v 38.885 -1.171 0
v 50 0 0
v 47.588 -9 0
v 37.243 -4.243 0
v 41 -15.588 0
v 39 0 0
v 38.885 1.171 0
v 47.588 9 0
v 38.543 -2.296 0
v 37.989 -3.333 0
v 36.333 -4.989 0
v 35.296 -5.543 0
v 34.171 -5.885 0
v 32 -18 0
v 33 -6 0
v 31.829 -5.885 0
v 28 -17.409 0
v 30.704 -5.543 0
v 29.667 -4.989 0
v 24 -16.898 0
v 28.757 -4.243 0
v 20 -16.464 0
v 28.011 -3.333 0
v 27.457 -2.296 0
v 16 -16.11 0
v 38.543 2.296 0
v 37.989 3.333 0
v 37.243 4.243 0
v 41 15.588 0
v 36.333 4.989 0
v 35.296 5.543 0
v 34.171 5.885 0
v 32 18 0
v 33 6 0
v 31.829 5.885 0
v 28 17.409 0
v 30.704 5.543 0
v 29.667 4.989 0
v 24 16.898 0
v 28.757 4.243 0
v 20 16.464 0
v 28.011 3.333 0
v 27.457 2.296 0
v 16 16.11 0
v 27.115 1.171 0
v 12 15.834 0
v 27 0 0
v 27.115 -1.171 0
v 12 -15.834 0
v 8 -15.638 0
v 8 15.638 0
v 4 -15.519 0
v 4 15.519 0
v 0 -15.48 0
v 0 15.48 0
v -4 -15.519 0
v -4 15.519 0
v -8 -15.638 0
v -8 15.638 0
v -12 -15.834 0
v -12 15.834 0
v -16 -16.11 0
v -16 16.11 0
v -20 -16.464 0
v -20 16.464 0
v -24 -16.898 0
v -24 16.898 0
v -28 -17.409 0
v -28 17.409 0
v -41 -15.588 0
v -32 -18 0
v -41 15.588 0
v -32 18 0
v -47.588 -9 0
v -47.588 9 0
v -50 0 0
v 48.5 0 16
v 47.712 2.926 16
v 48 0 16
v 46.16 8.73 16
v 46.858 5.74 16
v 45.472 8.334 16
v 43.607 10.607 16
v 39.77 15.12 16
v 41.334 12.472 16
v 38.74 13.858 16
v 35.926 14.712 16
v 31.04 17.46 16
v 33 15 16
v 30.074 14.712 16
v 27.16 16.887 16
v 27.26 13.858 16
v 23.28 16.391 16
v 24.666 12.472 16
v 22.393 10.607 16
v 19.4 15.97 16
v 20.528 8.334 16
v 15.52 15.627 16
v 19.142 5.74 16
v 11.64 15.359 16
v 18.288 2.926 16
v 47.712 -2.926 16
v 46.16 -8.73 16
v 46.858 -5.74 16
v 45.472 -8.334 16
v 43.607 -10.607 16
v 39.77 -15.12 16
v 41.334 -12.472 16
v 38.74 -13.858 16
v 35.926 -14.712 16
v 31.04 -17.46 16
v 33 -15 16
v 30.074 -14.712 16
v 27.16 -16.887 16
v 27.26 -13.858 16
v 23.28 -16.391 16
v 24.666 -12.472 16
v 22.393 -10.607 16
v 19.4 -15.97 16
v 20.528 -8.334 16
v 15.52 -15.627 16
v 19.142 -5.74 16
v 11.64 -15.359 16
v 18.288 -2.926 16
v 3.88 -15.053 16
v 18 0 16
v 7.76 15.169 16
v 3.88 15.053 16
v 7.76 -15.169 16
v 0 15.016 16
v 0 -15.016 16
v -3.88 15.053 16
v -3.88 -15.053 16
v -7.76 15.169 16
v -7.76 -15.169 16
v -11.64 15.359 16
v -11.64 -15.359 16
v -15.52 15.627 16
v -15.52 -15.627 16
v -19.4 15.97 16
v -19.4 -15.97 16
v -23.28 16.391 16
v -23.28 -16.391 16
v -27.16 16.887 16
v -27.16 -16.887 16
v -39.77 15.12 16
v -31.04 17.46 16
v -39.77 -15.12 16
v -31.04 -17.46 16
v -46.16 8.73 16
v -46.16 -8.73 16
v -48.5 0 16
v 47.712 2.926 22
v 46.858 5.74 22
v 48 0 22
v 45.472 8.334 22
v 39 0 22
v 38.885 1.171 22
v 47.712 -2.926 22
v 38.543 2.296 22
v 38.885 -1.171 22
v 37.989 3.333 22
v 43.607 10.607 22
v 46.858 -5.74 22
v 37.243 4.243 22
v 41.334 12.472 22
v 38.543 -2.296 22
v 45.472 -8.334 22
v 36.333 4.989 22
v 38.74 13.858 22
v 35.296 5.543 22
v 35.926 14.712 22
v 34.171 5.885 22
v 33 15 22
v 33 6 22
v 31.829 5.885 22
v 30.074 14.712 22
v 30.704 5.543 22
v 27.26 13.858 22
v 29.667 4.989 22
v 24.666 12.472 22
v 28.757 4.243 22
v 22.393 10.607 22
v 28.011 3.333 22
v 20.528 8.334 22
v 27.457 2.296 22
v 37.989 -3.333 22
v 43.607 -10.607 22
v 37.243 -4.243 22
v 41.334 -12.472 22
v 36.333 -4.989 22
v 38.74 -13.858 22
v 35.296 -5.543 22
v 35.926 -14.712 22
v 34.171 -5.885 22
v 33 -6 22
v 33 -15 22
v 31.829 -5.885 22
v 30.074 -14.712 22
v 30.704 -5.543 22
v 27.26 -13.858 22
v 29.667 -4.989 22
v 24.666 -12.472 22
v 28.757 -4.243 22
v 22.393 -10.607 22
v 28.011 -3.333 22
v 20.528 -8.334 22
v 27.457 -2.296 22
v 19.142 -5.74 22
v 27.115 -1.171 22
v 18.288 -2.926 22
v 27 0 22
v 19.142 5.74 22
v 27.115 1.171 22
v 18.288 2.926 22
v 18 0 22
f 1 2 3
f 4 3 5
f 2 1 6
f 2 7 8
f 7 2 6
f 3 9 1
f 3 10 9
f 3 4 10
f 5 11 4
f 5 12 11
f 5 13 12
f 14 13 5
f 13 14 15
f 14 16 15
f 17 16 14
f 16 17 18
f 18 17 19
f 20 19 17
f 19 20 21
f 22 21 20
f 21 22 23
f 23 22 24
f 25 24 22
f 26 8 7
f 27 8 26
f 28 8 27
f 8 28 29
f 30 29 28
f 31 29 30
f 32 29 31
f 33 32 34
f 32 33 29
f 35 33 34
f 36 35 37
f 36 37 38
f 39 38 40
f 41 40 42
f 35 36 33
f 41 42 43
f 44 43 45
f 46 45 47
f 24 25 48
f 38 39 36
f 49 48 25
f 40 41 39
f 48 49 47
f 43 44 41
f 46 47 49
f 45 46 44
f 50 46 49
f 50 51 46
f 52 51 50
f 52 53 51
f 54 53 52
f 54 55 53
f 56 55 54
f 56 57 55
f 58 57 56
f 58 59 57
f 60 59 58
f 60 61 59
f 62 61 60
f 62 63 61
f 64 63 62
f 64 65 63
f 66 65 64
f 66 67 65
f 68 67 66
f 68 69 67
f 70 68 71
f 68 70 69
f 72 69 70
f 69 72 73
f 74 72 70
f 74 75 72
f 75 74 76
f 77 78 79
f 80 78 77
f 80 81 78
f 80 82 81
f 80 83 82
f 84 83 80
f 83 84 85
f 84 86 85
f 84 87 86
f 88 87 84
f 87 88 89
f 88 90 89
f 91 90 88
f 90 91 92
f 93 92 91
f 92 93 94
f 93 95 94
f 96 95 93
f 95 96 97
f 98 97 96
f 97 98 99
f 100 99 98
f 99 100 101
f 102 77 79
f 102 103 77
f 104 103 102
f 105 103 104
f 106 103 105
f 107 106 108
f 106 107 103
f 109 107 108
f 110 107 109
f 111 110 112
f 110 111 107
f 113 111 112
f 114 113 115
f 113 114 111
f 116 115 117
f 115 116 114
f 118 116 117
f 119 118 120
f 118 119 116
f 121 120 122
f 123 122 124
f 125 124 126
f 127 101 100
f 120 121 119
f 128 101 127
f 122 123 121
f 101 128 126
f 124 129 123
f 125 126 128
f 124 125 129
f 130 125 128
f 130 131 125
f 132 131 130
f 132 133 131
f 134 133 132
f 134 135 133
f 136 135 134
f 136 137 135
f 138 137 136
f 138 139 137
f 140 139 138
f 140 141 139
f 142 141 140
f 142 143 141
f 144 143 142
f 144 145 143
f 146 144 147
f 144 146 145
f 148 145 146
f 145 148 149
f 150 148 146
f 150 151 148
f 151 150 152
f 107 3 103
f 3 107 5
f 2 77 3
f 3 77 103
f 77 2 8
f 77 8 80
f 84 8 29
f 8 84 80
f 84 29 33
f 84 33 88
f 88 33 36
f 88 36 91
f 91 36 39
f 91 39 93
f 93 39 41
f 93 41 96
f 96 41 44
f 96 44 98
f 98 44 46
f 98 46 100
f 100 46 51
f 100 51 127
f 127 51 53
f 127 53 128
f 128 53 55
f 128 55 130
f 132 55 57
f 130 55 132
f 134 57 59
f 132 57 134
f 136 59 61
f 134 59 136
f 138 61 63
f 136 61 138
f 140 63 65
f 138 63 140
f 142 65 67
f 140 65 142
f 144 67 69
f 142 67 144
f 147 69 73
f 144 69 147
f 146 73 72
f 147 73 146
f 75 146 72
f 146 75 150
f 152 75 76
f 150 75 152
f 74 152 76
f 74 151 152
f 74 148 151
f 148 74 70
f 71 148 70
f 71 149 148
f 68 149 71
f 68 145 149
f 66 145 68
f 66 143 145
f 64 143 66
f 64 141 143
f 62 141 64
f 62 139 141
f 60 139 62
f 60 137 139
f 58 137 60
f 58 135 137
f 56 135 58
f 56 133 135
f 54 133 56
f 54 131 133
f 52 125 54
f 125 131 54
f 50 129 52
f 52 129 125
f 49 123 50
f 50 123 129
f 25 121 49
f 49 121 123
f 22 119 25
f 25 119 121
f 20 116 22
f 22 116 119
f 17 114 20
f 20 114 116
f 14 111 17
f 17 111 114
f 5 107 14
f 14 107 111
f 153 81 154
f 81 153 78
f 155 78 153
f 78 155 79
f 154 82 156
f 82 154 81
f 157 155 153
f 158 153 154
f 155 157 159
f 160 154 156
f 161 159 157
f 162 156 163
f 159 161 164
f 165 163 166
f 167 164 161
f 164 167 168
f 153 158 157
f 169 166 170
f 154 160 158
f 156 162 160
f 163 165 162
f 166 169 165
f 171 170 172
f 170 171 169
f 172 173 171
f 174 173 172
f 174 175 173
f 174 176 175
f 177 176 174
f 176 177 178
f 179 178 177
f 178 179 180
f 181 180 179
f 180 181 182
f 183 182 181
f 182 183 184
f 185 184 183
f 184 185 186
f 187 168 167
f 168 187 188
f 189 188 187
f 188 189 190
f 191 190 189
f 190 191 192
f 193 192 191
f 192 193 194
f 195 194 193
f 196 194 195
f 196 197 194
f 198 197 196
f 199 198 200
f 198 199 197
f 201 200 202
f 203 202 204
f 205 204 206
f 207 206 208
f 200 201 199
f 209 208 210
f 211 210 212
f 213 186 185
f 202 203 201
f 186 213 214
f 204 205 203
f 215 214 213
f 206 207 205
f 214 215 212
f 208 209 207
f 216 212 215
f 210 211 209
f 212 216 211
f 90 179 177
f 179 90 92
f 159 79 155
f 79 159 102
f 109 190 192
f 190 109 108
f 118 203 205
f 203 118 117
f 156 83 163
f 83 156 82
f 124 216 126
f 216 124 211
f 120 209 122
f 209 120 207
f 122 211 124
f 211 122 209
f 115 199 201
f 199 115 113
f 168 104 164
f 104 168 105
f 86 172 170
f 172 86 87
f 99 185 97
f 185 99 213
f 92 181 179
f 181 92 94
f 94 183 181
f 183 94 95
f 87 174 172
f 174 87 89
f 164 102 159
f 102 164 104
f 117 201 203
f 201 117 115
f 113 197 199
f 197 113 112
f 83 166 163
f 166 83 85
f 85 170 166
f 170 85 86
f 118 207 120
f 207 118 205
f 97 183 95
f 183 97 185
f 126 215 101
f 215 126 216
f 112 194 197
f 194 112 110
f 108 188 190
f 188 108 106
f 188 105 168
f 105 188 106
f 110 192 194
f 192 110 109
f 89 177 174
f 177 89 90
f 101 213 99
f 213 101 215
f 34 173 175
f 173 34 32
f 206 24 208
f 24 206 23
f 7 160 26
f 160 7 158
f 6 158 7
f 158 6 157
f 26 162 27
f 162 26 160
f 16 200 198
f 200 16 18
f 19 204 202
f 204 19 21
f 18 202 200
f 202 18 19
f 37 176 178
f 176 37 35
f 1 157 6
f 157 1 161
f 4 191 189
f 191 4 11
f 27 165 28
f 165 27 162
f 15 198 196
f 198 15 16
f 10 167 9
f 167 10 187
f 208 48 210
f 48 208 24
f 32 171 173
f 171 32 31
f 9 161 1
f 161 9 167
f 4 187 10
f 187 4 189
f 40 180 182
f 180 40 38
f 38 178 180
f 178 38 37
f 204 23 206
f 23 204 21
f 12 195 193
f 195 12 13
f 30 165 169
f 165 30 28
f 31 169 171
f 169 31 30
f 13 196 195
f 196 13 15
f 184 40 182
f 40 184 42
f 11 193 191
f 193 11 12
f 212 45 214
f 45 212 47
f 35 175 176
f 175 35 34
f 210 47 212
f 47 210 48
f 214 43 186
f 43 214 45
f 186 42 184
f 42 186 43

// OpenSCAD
$fn = 32;

// ----------------------------------------------------------------------
// Handle: 100 x 36 mm grip, 16 mm thick
// ----------------------------------------------------------------------

// --- parameters (mm) ---
length = 100;             // grip length
width = 36;               // grip width
thickness = 16;           // grip thickness
waist = 0.86;             // width factor at the middle
draft = 0.97;             // top face scale of the extrusion
boss_d = 30;              // mounting boss diameter
boss_h = 6;               // mounting boss height
boss_hole_d = 12;         // screw clearance through the boss
boss_r = 33;              // boss centre from the grip centre

/* ergonomic grip outline, closed spline-like polygon in the XY plane */
grip = [[-32, 18], [-28, 17.409], [-24, 16.898], [-20, 16.464], [-16, 16.11], [-12, 15.834], [-8, 15.638], [-4, 15.519], [0, 15.48], [4, 15.519], [8, 15.638], [12, 15.834], [16, 16.11], [20, 16.464], [24, 16.898], [28, 17.409], [32, 18], [41, 15.588], [47.588, 9], [50, 0], [47.588, -9], [41, -15.588], [32, -18], [32, -18], [28, -17.409], [24, -16.898], [20, -16.464], [16, -16.11], [12, -15.834], [8, -15.638], [4, -15.519], [0, -15.48], [-4, -15.519], [-8, -15.638], [-12, -15.834], [-16, -16.11], [-20, -16.464], [-24, -16.898], [-28, -17.409], [-32, -18], [-41, -15.588], [-47.588, -9], [-50, 0], [-47.588, 9], [-41, 15.588], [-32, 18]];

module grip_body() {
  linear_extrude(height = thickness, scale = draft) polygon(grip);
}

module boss_body() {
  /* sunk 1 mm into the grip so the joint overlaps */
  translate([boss_r, 0, thickness - 1]) cylinder(h = boss_h + 1, d = boss_d);
}

difference() {
  union() {
    grip_body();
    boss_body();
  }
  translate([boss_r, 0, -1]) cylinder(h = thickness + boss_h + 2, d = boss_hole_d);
}
